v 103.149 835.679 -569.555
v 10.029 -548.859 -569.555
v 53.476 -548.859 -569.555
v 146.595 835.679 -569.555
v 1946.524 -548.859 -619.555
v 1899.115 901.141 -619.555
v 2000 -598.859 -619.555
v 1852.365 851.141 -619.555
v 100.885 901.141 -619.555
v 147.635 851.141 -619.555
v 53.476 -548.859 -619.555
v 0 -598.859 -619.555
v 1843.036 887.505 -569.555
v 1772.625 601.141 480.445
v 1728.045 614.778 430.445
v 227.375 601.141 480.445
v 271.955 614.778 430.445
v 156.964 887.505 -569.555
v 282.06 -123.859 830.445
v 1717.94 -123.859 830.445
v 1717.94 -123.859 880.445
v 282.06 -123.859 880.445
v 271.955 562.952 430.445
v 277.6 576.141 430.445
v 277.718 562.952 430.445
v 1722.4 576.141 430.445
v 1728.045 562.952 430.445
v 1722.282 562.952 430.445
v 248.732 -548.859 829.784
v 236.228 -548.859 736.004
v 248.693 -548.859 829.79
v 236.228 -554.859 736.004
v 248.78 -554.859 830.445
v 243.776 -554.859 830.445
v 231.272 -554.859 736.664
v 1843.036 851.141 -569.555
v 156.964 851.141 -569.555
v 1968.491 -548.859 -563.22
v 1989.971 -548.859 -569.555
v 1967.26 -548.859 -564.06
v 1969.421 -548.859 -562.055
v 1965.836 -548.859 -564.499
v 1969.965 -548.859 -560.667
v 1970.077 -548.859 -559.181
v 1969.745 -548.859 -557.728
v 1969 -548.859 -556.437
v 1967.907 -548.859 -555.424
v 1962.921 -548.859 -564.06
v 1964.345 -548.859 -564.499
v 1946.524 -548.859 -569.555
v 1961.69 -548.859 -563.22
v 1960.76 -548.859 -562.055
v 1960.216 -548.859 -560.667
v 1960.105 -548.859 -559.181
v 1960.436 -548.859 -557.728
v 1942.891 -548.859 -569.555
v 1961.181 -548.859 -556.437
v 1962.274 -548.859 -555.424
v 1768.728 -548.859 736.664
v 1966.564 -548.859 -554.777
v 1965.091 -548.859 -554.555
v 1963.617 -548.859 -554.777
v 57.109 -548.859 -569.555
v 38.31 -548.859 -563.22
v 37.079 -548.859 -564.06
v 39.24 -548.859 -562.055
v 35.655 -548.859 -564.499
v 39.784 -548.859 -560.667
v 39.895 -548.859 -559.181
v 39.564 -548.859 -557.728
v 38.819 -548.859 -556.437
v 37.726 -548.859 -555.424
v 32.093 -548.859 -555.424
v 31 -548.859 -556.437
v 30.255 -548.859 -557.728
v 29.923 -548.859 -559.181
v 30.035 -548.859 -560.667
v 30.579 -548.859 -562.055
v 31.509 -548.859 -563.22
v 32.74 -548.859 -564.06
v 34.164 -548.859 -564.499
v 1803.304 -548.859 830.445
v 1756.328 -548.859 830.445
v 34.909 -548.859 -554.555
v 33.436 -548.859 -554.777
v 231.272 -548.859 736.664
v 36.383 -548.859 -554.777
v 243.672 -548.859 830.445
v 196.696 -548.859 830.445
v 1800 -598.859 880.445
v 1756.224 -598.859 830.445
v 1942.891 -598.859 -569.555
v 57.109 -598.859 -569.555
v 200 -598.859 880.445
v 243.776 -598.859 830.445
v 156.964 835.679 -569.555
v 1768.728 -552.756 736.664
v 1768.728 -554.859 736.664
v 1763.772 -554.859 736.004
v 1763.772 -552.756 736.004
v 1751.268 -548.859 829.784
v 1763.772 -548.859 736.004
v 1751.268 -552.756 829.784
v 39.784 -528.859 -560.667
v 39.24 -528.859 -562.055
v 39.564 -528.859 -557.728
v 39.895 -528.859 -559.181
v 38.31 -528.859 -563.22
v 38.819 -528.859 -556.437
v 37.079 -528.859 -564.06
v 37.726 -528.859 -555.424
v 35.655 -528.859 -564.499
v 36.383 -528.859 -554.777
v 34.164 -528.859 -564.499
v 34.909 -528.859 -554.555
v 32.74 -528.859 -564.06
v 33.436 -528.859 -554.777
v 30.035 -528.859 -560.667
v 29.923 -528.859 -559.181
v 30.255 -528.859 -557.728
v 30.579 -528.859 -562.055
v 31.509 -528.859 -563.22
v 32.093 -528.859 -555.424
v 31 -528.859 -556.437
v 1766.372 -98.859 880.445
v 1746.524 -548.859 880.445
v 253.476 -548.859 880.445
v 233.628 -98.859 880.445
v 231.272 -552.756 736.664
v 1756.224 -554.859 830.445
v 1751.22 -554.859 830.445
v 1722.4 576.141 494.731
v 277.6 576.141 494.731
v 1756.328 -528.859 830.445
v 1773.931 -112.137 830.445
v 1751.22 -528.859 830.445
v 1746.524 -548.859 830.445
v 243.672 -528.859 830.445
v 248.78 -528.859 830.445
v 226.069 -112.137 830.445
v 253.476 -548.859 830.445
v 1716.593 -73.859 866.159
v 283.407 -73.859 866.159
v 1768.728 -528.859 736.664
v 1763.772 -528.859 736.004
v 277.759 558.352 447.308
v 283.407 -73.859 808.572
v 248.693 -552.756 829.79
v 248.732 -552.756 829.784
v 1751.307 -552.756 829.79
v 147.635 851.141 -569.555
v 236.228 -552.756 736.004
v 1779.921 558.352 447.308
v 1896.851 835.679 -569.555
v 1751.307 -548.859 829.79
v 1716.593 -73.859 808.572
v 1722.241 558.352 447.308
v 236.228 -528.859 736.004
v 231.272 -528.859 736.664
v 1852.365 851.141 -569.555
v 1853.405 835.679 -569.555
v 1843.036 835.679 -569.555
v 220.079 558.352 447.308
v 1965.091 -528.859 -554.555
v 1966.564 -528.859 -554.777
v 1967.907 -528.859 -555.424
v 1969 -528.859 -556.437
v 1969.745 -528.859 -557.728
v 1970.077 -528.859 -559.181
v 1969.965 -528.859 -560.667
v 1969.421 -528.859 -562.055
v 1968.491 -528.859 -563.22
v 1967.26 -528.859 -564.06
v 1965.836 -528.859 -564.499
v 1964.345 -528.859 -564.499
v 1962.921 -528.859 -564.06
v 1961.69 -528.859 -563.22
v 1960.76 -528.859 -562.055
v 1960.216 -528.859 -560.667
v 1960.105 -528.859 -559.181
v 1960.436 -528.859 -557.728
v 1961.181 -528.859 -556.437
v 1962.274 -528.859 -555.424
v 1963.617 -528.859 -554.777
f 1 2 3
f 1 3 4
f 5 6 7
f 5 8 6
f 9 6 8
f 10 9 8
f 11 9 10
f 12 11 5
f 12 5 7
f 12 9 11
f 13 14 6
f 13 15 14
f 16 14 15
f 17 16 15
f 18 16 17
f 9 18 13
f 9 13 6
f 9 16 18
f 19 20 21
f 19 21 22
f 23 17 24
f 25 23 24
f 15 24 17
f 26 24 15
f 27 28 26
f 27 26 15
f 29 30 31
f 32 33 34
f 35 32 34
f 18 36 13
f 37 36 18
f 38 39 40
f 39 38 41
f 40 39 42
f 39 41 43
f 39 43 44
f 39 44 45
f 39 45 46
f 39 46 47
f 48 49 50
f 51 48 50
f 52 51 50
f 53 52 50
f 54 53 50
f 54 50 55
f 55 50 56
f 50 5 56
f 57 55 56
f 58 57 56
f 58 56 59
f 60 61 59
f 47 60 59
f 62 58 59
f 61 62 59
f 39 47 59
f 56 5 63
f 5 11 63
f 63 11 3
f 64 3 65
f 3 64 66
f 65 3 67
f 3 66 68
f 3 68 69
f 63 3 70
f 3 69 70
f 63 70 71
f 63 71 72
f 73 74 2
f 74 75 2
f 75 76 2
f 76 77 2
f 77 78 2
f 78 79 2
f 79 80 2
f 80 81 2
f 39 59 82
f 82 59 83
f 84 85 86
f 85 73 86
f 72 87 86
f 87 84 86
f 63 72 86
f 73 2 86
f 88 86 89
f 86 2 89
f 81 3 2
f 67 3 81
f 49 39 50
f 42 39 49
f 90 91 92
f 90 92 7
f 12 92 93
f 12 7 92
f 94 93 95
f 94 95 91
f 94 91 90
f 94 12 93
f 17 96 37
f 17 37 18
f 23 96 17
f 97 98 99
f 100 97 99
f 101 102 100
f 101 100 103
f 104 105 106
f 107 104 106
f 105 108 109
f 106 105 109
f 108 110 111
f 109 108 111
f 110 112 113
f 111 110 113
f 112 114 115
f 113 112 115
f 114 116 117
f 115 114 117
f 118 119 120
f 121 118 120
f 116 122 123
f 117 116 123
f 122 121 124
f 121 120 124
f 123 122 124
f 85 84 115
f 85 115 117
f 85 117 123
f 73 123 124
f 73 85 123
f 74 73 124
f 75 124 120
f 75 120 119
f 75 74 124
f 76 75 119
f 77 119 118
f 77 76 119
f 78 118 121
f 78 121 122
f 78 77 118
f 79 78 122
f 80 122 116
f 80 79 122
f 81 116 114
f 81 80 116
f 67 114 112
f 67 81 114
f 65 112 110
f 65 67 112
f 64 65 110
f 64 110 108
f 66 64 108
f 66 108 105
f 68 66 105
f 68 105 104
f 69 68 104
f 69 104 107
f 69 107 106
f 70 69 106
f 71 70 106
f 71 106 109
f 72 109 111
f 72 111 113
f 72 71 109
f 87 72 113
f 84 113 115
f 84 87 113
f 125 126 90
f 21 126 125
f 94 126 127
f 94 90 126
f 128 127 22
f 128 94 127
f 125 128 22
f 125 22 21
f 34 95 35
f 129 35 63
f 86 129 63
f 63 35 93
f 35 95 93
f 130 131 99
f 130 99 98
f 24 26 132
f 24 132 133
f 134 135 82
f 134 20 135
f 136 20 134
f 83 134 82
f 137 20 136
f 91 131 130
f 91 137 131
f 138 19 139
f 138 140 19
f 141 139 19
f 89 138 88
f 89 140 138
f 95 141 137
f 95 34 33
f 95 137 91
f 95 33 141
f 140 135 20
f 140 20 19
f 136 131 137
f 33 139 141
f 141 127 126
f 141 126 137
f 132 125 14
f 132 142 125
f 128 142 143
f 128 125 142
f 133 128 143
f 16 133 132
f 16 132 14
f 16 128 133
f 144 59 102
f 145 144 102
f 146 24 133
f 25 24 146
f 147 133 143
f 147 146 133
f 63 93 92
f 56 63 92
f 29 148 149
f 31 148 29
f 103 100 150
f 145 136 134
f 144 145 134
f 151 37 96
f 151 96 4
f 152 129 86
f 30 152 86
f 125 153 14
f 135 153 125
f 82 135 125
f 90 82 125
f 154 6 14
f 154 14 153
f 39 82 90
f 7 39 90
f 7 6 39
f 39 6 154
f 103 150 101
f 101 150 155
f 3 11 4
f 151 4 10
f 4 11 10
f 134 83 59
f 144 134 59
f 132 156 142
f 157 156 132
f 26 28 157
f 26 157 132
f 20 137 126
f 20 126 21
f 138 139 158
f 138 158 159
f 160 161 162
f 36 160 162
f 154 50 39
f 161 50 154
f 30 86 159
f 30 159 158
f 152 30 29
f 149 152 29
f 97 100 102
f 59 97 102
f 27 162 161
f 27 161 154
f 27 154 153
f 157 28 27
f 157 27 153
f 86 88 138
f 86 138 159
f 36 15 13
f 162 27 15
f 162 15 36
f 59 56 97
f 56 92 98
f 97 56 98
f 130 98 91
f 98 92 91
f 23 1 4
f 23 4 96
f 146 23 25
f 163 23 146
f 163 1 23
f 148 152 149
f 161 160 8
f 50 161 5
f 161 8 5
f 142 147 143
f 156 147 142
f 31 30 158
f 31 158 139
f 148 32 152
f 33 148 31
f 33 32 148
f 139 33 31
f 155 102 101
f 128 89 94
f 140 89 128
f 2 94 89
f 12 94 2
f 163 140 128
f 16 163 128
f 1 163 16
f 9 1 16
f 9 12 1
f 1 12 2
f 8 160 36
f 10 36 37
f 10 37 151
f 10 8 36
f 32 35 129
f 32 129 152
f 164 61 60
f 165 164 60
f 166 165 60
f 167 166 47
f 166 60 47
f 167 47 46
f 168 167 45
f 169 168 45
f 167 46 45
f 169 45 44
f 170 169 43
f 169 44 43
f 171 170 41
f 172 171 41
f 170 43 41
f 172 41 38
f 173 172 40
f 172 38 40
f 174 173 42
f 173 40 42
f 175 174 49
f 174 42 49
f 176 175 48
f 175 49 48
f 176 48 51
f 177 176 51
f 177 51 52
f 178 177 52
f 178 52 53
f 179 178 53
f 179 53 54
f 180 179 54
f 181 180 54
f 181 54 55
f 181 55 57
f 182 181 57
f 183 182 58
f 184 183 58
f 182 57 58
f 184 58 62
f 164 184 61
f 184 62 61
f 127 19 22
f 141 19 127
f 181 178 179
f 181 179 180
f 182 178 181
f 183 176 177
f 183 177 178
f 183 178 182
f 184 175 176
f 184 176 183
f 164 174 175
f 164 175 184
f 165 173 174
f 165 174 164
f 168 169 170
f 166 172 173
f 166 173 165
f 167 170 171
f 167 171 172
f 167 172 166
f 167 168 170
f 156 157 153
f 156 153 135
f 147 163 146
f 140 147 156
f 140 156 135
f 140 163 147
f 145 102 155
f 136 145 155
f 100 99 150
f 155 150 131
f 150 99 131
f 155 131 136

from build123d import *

# Parameters (mm, degrees)
BOSS_EXTRU_1_DEPTH           = 2000
ENL_V_MAT_EXTRU_1_DEPTH      = 2000
ENL_V_MAT_EXTRU_2_DEPTH      = 2000
ENL_V_MAT_EXTRU_3_DEPTH      = 2000
ENL_V_MAT_EXTRU_4_DEPTH      = 2933
ENL_V_MAT_EXTRU_5_DEPTH      = 2933
ENL_V_MAT_EXTRU_5_DEPTH_BACK = 2933
ENL_V_MAT_EXTRU_6_DEPTH      = 50
ENL_V_MAT_EXTRU_7_DEPTH      = 1023
ENL_V_MAT_EXTRU_8_DEPTH      = 50
ESQUISSE14_W                 = 94.610765079
ESQUISSE14_H                 = 3.897152032
BOSS_EXTRU_2_DEPTH           = 5
BOSS_EXTRU_28_START          = -6
BOSS_EXTRU_28_DEPTH          = 26
ESQUISSE12_R                 = 5
BOSS_EXTRU_29_DEPTH          = 20


with BuildPart() as part:
    # Esquisse1 → Boss.-Extru.1 (new body)
    with BuildSketch(Plane(origin=(0, 0, 0), x_dir=(0, 0, -1), z_dir=(1, 0, 0))):
        Polygon((-880.445159684, -98.858699346), (-480.445159684, 601.141300654), (619.554840316, 901.141300654), (619.554840316, -598.858699346), (-880.445159684, -598.858699346), align=None)
    extrude(amount=BOSS_EXTRU_1_DEPTH)

    # Esquisse2 → Enlèv. mat.-Extru.1 (cut)
    with BuildSketch(Plane.XZ.offset(598.858699346)):
        Polygon((2000, -619.554840316), (1800, 880.445159684), (2000, 880.445159684), align=None)
        Polygon((200, 880.445159684), (0, 880.445159684), (0, -619.554840316), align=None)
    extrude(amount=-ENL_V_MAT_EXTRU_1_DEPTH, mode=Mode.SUBTRACT)

    # Esquisse4 → Enlèv. mat.-Extru.2 (cut)
    with BuildSketch(Plane(origin=(116.098887378, 0, -870.741655333), x_dir=(0, 1, 0), z_dir=(0.13216372009101793, 0, -0.9912279006826347))):
        Polygon((-598.858699346, 1900.573128869), (901.141300654, 1900.573128869), (901.141300654, 1800.573128869), align=None)
    extrude(amount=-ENL_V_MAT_EXTRU_2_DEPTH, mode=Mode.SUBTRACT)

    # Esquisse5 → Enlèv. mat.-Extru.3 (cut)
    with BuildSketch(Plane(origin=(-81.164389561, 0, -608.732921708), x_dir=(0, 1, 0), z_dir=(0.13216372009101793, 0, 0.9912279006826347))):
        Polygon((901.141300654, -81.882672497), (-598.858699346, -81.882672497), (901.141300654, -181.882672497), align=None)
    extrude(amount=ENL_V_MAT_EXTRU_3_DEPTH, mode=Mode.SUBTRACT)

    # Esquisse6 → Enlèv. mat.-Extru.4 (cut)
    with BuildSketch(Plane(origin=(0, 0, 0), x_dir=(0, 0, -1), z_dir=(1, 0, 0))):
        Polygon((569.554840316, 835.678781331), (-447.308376432, 558.35244949), (-830.445159684, -112.1369212), (-830.445159684, -548.858699346), (569.554840316, -548.858699346), align=None)
    extrude(amount=ENL_V_MAT_EXTRU_4_DEPTH, mode=Mode.SUBTRACT)

    # Esquisse7 → Enlèv. mat.-Extru.5 (cut, two sides: drawn at the far end of the back side and taken through both)
    with BuildSketch(Plane.XY.offset(-ENL_V_MAT_EXTRU_5_DEPTH_BACK)):
        Polygon((282.05986694, -123.858699346), (253.475791256, -548.858699346), (1746.524208744, -548.858699346), (1717.94013306, -123.858699346), align=None)
        Polygon((283.406973938, -73.858699346), (1716.593026062, -73.858699346), (1722.400013951, 576.141300654), (277.599986049, 576.141300654), align=None)
        Polygon((176.229227458, 851.141300654), (271.096481507, 626.141300654), (1728.903518493, 626.141300654), (1823.770772542, 851.141300654), align=None)
    extrude(amount=ENL_V_MAT_EXTRU_5_DEPTH + ENL_V_MAT_EXTRU_5_DEPTH_BACK, mode=Mode.SUBTRACT)

    # Esquisse8 → Enlèv. mat.-Extru.6 (cut)
    with BuildSketch(Plane(origin=(0, 0, -619.554840316), x_dir=(-1, 0, 0), z_dir=(0, 0, -1))):
        Polygon((-1852.364900608, 851.141300654), (-1946.524208744, -548.858699346), (-53.475791256, -548.858699346), (-147.635099392, 851.141300654), align=None)
    extrude(amount=-ENL_V_MAT_EXTRU_6_DEPTH, mode=Mode.SUBTRACT)

    # Esquisse9 → Enlèv. mat.-Extru.7 (cut)
    with BuildSketch(Plane(origin=(0, 0, 0), x_dir=(1, 0, 0), z_dir=(0, 1, 0))):
        Polygon((156.96398896, 569.554840316), (271.954599929, -430.445159684), (1728.045400071, -430.445159684), (1843.03601104, 569.554840316), align=None)
    extrude(amount=ENL_V_MAT_EXTRU_7_DEPTH, mode=Mode.SUBTRACT)

    # Esquisse10 → Enlèv. mat.-Extru.8 (cut)
    with BuildSketch(Plane.XZ.offset(598.858699346)):
        Polygon((243.775819835, 830.445159684), (57.109153168, -569.554840316), (1942.890846832, -569.554840316), (1756.224180165, 830.445159684), align=None)
    extrude(amount=-ENL_V_MAT_EXTRU_8_DEPTH, mode=Mode.SUBTRACT)

    # Esquisse14 → Boss.-Extru.2 (add)
    with BuildSketch(Plane(origin=(1834.339717588, 0, 244.578629012), x_dir=(-0.13216372009101796, 0, 0.9912279006826348), z_dir=(-0.9912279006826348, 0, -0.13216372009101796))):
        with Locations((543.745908762, -550.807275362)):
            Rectangle(ESQUISSE14_W, ESQUISSE14_H)
    boss_extru_2 = extrude(amount=BOSS_EXTRU_2_DEPTH)

    # Esquisse15 → Boss.-Extru.28 (add)
    with BuildSketch(Plane(origin=(0, -548.858699346, 0), x_dir=(1, 0, 0), z_dir=(0, 1, 0)).offset(BOSS_EXTRU_28_START)):
        Polygon((1768.728290839, -736.664329633), (1763.772151335, -736.003511032), (1751.203848273, -830.563782674), (1756.224180165, -831.231050773), align=None)
    boss_extru_28 = extrude(amount=BOSS_EXTRU_28_DEPTH)

    # Esquisse12 → Boss.-Extru.29 (add)
    with BuildSketch(Plane(origin=(0, -548.858699346, 0), x_dir=(1, 0, 0), z_dir=(0, 1, 0))):
        with Locations(Location((1965.090614868, 559.554840316, 0), (0, 0, 270))):
            Circle(ESQUISSE12_R)
    boss_extru_29 = extrude(amount=BOSS_EXTRU_29_DEPTH)

    # Symétrie1: Boss.-Extru.2, Boss.-Extru.28, Boss.-Extru.29 across plane
    add(boss_extru_2.mirror(Plane(origin=(1000, 0, 0), x_dir=(0, 0, 1), z_dir=(1, 0, 0))))
    add(boss_extru_28.mirror(Plane(origin=(1000, 0, 0), x_dir=(0, 0, 1), z_dir=(1, 0, 0))))
    add(boss_extru_29.mirror(Plane(origin=(1000, 0, 0), x_dir=(0, 0, 1), z_dir=(1, 0, 0))))


solid = part.part
